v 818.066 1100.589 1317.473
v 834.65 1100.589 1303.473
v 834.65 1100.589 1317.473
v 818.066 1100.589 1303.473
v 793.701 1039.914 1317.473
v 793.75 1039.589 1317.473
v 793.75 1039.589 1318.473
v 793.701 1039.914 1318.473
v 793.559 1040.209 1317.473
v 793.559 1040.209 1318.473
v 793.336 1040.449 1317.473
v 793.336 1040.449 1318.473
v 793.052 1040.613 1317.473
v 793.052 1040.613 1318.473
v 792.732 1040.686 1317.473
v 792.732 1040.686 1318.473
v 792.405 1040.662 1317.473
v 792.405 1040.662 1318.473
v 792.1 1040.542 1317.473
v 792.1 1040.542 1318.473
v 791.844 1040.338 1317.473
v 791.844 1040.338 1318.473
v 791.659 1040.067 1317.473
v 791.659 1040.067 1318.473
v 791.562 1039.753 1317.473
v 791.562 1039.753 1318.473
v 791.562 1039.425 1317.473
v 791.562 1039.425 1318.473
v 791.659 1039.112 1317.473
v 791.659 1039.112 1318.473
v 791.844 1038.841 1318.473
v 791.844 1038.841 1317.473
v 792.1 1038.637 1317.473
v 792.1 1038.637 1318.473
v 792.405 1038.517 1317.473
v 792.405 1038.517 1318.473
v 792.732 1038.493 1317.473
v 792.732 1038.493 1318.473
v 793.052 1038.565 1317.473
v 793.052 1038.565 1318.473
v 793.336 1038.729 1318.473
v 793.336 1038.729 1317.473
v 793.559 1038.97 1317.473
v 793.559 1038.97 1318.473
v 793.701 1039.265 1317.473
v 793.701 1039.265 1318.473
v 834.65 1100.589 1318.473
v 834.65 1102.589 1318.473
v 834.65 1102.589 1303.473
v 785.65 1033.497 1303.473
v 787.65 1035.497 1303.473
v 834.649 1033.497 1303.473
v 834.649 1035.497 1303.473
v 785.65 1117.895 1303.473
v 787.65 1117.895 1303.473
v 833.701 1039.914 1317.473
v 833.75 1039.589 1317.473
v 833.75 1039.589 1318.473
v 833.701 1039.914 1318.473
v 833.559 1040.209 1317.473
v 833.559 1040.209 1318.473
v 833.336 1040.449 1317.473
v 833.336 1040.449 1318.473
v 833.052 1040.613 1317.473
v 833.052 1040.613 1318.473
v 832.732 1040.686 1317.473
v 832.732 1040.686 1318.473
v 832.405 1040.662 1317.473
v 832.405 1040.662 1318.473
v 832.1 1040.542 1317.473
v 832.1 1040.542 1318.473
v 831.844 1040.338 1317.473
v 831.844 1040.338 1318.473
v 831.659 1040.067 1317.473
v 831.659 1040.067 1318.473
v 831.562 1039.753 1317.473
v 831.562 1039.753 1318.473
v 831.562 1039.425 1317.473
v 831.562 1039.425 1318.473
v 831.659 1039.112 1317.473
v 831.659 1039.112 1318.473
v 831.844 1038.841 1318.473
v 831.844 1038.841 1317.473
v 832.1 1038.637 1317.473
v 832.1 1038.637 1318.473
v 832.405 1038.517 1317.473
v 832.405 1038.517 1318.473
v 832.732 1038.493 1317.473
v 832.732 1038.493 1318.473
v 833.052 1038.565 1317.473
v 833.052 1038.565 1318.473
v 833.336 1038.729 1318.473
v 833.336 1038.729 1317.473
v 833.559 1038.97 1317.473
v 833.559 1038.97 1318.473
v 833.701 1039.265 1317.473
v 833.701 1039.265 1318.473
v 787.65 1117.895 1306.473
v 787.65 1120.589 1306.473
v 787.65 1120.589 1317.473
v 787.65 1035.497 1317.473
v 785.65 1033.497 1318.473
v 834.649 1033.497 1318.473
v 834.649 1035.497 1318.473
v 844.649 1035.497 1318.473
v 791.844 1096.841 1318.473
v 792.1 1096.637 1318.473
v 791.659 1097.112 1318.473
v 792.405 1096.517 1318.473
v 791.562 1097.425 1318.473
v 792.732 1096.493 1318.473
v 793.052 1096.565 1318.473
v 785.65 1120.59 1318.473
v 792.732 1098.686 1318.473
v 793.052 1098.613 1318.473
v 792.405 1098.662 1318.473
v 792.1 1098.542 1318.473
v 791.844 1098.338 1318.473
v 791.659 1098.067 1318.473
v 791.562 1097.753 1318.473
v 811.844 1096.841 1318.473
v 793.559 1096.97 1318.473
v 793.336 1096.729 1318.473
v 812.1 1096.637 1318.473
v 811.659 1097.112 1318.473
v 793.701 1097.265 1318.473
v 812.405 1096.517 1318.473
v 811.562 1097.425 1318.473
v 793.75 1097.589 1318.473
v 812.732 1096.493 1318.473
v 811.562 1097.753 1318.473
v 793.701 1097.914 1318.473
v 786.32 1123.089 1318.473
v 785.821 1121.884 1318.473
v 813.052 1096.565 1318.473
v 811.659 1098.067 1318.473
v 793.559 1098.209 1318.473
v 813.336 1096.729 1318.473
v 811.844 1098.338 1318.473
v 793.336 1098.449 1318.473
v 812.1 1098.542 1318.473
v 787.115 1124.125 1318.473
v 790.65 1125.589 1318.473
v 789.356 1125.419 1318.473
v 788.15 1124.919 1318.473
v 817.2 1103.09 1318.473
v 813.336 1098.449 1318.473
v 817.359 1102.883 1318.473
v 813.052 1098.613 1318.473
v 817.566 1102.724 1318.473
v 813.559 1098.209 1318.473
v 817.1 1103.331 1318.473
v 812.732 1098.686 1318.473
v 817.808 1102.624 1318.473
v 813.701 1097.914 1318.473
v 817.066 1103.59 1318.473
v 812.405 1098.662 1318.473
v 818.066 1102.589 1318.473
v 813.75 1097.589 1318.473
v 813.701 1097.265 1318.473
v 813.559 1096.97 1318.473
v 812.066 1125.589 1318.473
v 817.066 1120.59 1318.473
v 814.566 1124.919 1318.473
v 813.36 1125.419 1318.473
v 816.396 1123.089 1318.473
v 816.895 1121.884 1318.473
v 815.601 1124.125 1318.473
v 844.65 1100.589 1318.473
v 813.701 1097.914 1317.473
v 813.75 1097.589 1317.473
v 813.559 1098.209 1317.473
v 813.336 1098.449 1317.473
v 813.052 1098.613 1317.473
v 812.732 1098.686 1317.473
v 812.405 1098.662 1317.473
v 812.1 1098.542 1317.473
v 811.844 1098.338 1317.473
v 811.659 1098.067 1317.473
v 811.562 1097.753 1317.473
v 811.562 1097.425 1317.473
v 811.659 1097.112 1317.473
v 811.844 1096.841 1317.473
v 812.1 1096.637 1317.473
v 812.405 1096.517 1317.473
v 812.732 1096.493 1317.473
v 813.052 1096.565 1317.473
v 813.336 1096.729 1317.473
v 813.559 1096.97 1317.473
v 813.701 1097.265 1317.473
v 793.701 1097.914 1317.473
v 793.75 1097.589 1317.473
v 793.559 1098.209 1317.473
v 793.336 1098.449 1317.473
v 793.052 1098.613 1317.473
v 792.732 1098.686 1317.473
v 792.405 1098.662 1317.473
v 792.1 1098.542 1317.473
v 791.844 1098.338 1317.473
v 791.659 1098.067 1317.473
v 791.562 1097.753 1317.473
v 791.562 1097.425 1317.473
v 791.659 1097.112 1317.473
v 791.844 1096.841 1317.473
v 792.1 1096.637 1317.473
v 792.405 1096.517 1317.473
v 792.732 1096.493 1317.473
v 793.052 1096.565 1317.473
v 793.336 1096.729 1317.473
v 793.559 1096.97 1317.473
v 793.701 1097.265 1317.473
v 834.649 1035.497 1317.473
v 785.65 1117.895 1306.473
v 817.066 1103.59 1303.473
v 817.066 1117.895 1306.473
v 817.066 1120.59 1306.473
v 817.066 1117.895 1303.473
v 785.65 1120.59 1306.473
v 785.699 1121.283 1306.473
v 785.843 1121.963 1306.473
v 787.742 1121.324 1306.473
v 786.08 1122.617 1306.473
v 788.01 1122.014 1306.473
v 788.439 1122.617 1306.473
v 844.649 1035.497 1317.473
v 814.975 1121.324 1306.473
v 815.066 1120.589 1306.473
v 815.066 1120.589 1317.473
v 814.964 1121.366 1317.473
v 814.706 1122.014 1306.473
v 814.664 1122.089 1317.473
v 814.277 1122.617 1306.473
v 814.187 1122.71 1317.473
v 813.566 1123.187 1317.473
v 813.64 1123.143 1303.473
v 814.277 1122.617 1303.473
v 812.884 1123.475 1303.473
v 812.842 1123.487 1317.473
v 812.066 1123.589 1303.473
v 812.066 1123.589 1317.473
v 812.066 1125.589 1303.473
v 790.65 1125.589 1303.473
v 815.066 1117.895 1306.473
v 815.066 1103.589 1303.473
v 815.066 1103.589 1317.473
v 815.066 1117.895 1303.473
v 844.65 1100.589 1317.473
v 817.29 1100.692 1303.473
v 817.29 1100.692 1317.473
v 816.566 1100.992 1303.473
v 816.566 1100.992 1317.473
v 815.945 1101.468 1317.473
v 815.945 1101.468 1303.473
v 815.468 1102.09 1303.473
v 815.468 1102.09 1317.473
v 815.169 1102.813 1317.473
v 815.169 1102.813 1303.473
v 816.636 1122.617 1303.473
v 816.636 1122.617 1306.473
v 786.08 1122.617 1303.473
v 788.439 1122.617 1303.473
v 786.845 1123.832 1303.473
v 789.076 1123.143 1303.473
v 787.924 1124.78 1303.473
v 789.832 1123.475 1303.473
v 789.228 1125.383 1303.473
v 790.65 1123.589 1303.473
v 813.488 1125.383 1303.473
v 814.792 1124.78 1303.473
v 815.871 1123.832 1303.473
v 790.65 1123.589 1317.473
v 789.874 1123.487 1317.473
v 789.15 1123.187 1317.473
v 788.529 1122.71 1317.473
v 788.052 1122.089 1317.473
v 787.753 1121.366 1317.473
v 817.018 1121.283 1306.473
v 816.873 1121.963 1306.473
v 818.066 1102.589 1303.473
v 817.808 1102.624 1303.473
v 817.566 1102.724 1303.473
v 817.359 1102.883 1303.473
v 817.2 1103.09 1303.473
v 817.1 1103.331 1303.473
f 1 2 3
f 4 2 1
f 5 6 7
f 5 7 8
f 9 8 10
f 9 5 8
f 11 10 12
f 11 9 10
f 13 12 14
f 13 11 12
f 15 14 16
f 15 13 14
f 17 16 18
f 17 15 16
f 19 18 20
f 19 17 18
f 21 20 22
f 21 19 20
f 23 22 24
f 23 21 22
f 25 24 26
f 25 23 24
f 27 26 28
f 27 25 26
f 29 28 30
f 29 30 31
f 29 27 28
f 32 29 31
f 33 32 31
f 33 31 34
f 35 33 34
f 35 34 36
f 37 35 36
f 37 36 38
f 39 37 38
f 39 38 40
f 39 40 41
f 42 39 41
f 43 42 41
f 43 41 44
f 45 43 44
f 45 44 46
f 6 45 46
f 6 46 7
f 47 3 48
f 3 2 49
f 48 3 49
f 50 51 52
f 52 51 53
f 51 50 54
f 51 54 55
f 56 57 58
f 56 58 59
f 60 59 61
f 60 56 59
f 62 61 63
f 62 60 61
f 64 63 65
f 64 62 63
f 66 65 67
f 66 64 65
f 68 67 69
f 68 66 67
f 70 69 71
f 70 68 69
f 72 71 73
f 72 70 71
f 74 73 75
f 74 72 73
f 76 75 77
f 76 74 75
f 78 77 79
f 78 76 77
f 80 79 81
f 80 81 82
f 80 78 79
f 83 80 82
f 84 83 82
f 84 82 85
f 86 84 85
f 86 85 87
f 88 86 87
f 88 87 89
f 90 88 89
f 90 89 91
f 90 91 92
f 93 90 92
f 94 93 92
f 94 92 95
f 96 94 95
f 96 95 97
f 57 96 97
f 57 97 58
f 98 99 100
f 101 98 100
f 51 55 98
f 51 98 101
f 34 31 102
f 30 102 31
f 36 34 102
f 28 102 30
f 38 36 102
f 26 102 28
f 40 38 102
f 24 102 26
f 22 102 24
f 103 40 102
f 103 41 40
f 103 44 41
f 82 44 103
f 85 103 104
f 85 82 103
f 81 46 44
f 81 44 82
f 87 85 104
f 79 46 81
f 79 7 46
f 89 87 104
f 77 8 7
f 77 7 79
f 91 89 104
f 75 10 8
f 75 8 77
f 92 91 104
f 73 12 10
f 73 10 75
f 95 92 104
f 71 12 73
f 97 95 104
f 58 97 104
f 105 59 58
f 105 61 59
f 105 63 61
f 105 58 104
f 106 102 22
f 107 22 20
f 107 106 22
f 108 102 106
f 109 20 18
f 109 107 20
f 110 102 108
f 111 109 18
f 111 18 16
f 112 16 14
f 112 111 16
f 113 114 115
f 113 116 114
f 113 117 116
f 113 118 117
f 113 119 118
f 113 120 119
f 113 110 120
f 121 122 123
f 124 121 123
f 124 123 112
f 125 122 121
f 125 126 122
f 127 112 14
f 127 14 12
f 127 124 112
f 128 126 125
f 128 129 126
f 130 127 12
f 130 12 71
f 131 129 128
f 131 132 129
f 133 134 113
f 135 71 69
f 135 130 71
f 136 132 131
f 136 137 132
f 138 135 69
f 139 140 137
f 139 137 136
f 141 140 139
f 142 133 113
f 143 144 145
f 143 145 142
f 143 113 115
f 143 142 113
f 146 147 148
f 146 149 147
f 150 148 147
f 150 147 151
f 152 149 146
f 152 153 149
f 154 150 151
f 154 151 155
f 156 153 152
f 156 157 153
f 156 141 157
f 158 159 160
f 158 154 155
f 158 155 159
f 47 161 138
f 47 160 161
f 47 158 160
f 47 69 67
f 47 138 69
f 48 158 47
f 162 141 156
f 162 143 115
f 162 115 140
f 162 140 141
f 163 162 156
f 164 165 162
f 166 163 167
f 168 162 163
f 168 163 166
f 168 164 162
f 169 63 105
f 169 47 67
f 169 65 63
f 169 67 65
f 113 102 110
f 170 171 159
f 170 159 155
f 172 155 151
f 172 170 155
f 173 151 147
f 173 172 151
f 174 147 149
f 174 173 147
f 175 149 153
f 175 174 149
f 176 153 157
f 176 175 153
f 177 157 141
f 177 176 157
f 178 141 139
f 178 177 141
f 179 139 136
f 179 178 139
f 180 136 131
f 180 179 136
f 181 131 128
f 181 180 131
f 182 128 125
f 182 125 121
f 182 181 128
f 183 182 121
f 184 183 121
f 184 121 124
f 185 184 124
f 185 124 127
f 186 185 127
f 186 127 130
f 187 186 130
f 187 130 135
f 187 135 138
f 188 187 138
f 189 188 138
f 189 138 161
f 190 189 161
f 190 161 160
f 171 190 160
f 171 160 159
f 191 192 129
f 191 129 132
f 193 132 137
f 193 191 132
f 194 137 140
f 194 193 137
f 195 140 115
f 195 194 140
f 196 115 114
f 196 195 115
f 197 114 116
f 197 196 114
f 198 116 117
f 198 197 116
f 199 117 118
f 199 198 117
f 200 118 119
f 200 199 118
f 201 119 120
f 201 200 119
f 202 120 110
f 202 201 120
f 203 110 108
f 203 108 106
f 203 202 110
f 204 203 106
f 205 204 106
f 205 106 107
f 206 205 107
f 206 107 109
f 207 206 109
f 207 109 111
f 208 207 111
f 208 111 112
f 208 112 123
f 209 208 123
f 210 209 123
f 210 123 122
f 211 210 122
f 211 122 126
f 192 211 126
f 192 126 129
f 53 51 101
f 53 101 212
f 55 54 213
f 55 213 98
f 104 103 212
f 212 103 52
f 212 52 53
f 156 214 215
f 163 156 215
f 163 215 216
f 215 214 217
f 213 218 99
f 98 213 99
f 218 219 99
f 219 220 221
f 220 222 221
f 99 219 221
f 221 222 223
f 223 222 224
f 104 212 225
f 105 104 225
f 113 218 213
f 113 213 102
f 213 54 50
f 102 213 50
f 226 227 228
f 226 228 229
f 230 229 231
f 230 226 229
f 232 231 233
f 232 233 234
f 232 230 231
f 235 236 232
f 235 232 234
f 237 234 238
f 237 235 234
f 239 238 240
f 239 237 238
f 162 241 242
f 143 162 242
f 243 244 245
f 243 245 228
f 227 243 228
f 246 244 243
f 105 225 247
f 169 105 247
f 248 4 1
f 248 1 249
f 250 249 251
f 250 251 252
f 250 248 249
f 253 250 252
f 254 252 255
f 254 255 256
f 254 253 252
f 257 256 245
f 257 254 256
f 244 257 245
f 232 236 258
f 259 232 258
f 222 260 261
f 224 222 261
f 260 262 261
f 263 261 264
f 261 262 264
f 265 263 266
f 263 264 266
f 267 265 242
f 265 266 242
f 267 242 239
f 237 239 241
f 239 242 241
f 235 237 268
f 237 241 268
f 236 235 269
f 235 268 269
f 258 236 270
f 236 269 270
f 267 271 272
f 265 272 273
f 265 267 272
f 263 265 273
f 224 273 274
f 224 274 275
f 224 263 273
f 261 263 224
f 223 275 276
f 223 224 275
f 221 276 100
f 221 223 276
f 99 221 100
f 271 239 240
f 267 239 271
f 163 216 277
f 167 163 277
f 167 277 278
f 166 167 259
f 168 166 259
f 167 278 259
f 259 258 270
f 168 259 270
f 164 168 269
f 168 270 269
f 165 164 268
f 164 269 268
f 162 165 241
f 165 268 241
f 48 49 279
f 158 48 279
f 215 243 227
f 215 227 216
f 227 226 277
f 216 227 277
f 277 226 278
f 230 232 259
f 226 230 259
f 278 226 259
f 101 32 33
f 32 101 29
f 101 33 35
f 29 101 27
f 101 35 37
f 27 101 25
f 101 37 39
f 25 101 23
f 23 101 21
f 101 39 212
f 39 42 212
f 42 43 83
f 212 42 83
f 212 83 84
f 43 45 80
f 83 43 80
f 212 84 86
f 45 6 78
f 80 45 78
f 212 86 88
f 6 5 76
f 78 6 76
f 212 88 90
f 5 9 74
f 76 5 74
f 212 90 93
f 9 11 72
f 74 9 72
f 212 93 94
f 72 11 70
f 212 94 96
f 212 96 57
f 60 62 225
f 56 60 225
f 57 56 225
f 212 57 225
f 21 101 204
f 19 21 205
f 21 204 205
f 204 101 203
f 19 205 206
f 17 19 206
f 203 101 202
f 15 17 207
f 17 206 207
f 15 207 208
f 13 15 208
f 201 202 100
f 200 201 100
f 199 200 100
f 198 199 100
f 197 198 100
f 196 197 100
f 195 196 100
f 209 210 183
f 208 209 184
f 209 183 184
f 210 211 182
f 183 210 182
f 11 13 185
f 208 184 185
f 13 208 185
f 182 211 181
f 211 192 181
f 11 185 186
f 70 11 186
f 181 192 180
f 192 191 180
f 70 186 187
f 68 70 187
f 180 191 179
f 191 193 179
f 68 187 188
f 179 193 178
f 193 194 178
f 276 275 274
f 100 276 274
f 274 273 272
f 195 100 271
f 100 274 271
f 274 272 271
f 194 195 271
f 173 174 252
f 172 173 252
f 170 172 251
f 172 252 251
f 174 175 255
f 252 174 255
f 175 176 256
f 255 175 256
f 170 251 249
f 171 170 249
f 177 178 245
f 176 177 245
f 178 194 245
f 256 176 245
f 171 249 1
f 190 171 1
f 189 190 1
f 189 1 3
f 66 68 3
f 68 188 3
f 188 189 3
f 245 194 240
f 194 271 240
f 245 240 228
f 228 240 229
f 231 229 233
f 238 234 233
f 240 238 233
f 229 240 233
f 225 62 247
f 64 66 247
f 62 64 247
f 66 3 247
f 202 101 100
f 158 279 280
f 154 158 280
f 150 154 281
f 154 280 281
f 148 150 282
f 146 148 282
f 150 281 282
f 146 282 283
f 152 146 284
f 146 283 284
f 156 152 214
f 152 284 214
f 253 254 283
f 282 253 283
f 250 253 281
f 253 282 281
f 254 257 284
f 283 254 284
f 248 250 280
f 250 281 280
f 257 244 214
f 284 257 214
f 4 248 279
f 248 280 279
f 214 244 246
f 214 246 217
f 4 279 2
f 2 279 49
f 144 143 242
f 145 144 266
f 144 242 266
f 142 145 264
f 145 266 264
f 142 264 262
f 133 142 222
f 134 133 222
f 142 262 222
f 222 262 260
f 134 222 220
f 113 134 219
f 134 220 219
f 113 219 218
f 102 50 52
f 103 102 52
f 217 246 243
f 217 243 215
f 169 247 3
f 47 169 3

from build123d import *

# Parameters (mm, degrees)
BOSS_EXTRUDE1_DEPTH = 15
BOSS_EXTRUDE2_DEPTH = 15
CUT_EXTRUDE1_DEPTH  = 14
SKETCH8_W           = 6.699223296
SKETCH8_H           = 4.721357371
SKETCH8_W_2         = 8.228893272
CUT_EXTRUDE7_DEPTH  = 3
SKETCH10_R          = 1.1
CUT_EXTRUDE9_DEPTH  = 15


with BuildPart() as part:
    # Sketch3 → Boss-Extrude1 (new body)
    with BuildSketch(Plane.XY.offset(1303.472903018)):
        with BuildLine():
            Line((787.650097371, 1035.49652121), (787.650097371, 1120.589424436))
            ThreePointArc((787.650097371, 1120.589424436), (788.529097371, 1122.710424436), (790.650097371, 1123.589424436))
            Line((790.650097371, 1123.589424436), (812.066097371, 1123.589424436))
            ThreePointArc((812.066097371, 1123.589424436), (814.187097371, 1122.710424436), (815.066097371, 1120.589424436))
            Line((815.066097371, 1120.589424436), (815.066097371, 1103.589424436))
            ThreePointArc((815.066097371, 1103.589424436), (815.945097371, 1101.468424436), (818.066097371, 1100.589424436))
            Line((818.066097371, 1100.589424436), (834.650097371, 1100.589424436))
            Line((834.650097371, 1100.589424436), (834.650461973, 1102.58942437))
            Line((834.650461973, 1102.58942437), (818.066461973, 1102.58942437))
            ThreePointArc((818.066461973, 1102.58942437), (817.35931084, 1102.882637905), (817.066097305, 1103.589789038))
            Line((817.066097305, 1103.589789038), (817.066097305, 1120.589789038))
            ThreePointArc((817.066097305, 1120.589789038), (815.601310896, 1124.124637961), (812.066461973, 1125.58942437))
            Line((812.066461973, 1125.58942437), (790.64973277, 1125.58942437))
            ThreePointArc((790.64973277, 1125.58942437), (787.114883847, 1124.124637961), (785.650097438, 1120.589789038))
            Line((785.650097438, 1120.589789038), (785.650097371, 1033.49652121))
            Line((785.650097371, 1033.49652121), (834.649003168, 1033.49652121))
            Line((834.649003168, 1033.49652121), (834.649003168, 1035.49652121))
            Line((834.649003168, 1035.49652121), (787.650097371, 1035.49652121))
        make_face()
    extrude(amount=BOSS_EXTRUDE1_DEPTH)

    # Sketch6 → Boss-Extrude2 (add)
    with BuildSketch(Plane.XY.offset(1303.472903018)):
        with BuildLine():
            Line((787.650097371, 1035.49652121), (834.649003168, 1035.49652121))
            Line((834.649003168, 1035.49652121), (844.649003168, 1035.49652121))
            Line((844.649003168, 1035.49652121), (844.650097371, 1100.589424436))
            Line((844.650097371, 1100.589424436), (834.650097371, 1100.589424436))
            Line((834.650097371, 1100.589424436), (818.066097371, 1100.589424436))
            ThreePointArc((818.066097371, 1100.589424436), (815.945097371, 1101.468424436), (815.066097371, 1103.589424436))
            Line((815.066097371, 1103.589424436), (815.066097371, 1120.589424436))
            ThreePointArc((815.066097371, 1120.589424436), (814.187097371, 1122.710424436), (812.066097371, 1123.589424436))
            Line((812.066097371, 1123.589424436), (790.650097371, 1123.589424436))
            ThreePointArc((790.650097371, 1123.589424436), (788.529097371, 1122.710424436), (787.650097371, 1120.589424436))
            Line((787.650097371, 1120.589424436), (787.650097371, 1035.49652121))
        make_face()
    extrude(amount=BOSS_EXTRUDE2_DEPTH)

    # Sketch6<2> → Cut-Extrude1 (cut)
    with BuildSketch(Plane.XY.offset(1303.472903018)):
        with BuildLine():
            Line((787.650097371, 1035.49652121), (834.649003168, 1035.49652121))
            Line((834.649003168, 1035.49652121), (844.649003168, 1035.49652121))
            Line((844.649003168, 1035.49652121), (844.650097371, 1100.589424436))
            Line((844.650097371, 1100.589424436), (834.650097371, 1100.589424436))
            Line((834.650097371, 1100.589424436), (818.066097371, 1100.589424436))
            ThreePointArc((818.066097371, 1100.589424436), (815.945097371, 1101.468424436), (815.066097371, 1103.589424436))
            Line((815.066097371, 1103.589424436), (815.066097371, 1120.589424436))
            ThreePointArc((815.066097371, 1120.589424436), (814.187097371, 1122.710424436), (812.066097371, 1123.589424436))
            Line((812.066097371, 1123.589424436), (790.650097371, 1123.589424436))
            ThreePointArc((790.650097371, 1123.589424436), (788.529097371, 1122.710424436), (787.650097371, 1120.589424436))
            Line((787.650097371, 1120.589424436), (787.650097371, 1035.49652121))
        make_face()
    extrude(amount=CUT_EXTRUDE1_DEPTH, mode=Mode.SUBTRACT)

    # Sketch8 → Cut-Extrude7 (cut)
    with BuildSketch(Plane.XY.offset(1303.472903018)):
        with Locations((788.177093813, 1120.255926572)):
            Rectangle(SKETCH8_W, SKETCH8_H)
        with Locations((813.958809837, 1120.255926572)):
            Rectangle(SKETCH8_W_2, SKETCH8_H)
    extrude(amount=CUT_EXTRUDE7_DEPTH, mode=Mode.SUBTRACT)

    # Sketch10 → Cut-Extrude9 (cut)
    with BuildSketch(Plane.XY.offset(1303.472903018)):
        with Locations((832.650097371, 1039.589424436)):
            Circle(SKETCH10_R)
        with Locations((792.650097371, 1039.589424436)):
            Circle(SKETCH10_R)
        with Locations((792.650097371, 1097.589424436)):
            Circle(SKETCH10_R)
        with Locations((812.650097371, 1097.589424436)):
            Circle(SKETCH10_R)
    extrude(amount=CUT_EXTRUDE9_DEPTH, mode=Mode.SUBTRACT)


solid = part.part
